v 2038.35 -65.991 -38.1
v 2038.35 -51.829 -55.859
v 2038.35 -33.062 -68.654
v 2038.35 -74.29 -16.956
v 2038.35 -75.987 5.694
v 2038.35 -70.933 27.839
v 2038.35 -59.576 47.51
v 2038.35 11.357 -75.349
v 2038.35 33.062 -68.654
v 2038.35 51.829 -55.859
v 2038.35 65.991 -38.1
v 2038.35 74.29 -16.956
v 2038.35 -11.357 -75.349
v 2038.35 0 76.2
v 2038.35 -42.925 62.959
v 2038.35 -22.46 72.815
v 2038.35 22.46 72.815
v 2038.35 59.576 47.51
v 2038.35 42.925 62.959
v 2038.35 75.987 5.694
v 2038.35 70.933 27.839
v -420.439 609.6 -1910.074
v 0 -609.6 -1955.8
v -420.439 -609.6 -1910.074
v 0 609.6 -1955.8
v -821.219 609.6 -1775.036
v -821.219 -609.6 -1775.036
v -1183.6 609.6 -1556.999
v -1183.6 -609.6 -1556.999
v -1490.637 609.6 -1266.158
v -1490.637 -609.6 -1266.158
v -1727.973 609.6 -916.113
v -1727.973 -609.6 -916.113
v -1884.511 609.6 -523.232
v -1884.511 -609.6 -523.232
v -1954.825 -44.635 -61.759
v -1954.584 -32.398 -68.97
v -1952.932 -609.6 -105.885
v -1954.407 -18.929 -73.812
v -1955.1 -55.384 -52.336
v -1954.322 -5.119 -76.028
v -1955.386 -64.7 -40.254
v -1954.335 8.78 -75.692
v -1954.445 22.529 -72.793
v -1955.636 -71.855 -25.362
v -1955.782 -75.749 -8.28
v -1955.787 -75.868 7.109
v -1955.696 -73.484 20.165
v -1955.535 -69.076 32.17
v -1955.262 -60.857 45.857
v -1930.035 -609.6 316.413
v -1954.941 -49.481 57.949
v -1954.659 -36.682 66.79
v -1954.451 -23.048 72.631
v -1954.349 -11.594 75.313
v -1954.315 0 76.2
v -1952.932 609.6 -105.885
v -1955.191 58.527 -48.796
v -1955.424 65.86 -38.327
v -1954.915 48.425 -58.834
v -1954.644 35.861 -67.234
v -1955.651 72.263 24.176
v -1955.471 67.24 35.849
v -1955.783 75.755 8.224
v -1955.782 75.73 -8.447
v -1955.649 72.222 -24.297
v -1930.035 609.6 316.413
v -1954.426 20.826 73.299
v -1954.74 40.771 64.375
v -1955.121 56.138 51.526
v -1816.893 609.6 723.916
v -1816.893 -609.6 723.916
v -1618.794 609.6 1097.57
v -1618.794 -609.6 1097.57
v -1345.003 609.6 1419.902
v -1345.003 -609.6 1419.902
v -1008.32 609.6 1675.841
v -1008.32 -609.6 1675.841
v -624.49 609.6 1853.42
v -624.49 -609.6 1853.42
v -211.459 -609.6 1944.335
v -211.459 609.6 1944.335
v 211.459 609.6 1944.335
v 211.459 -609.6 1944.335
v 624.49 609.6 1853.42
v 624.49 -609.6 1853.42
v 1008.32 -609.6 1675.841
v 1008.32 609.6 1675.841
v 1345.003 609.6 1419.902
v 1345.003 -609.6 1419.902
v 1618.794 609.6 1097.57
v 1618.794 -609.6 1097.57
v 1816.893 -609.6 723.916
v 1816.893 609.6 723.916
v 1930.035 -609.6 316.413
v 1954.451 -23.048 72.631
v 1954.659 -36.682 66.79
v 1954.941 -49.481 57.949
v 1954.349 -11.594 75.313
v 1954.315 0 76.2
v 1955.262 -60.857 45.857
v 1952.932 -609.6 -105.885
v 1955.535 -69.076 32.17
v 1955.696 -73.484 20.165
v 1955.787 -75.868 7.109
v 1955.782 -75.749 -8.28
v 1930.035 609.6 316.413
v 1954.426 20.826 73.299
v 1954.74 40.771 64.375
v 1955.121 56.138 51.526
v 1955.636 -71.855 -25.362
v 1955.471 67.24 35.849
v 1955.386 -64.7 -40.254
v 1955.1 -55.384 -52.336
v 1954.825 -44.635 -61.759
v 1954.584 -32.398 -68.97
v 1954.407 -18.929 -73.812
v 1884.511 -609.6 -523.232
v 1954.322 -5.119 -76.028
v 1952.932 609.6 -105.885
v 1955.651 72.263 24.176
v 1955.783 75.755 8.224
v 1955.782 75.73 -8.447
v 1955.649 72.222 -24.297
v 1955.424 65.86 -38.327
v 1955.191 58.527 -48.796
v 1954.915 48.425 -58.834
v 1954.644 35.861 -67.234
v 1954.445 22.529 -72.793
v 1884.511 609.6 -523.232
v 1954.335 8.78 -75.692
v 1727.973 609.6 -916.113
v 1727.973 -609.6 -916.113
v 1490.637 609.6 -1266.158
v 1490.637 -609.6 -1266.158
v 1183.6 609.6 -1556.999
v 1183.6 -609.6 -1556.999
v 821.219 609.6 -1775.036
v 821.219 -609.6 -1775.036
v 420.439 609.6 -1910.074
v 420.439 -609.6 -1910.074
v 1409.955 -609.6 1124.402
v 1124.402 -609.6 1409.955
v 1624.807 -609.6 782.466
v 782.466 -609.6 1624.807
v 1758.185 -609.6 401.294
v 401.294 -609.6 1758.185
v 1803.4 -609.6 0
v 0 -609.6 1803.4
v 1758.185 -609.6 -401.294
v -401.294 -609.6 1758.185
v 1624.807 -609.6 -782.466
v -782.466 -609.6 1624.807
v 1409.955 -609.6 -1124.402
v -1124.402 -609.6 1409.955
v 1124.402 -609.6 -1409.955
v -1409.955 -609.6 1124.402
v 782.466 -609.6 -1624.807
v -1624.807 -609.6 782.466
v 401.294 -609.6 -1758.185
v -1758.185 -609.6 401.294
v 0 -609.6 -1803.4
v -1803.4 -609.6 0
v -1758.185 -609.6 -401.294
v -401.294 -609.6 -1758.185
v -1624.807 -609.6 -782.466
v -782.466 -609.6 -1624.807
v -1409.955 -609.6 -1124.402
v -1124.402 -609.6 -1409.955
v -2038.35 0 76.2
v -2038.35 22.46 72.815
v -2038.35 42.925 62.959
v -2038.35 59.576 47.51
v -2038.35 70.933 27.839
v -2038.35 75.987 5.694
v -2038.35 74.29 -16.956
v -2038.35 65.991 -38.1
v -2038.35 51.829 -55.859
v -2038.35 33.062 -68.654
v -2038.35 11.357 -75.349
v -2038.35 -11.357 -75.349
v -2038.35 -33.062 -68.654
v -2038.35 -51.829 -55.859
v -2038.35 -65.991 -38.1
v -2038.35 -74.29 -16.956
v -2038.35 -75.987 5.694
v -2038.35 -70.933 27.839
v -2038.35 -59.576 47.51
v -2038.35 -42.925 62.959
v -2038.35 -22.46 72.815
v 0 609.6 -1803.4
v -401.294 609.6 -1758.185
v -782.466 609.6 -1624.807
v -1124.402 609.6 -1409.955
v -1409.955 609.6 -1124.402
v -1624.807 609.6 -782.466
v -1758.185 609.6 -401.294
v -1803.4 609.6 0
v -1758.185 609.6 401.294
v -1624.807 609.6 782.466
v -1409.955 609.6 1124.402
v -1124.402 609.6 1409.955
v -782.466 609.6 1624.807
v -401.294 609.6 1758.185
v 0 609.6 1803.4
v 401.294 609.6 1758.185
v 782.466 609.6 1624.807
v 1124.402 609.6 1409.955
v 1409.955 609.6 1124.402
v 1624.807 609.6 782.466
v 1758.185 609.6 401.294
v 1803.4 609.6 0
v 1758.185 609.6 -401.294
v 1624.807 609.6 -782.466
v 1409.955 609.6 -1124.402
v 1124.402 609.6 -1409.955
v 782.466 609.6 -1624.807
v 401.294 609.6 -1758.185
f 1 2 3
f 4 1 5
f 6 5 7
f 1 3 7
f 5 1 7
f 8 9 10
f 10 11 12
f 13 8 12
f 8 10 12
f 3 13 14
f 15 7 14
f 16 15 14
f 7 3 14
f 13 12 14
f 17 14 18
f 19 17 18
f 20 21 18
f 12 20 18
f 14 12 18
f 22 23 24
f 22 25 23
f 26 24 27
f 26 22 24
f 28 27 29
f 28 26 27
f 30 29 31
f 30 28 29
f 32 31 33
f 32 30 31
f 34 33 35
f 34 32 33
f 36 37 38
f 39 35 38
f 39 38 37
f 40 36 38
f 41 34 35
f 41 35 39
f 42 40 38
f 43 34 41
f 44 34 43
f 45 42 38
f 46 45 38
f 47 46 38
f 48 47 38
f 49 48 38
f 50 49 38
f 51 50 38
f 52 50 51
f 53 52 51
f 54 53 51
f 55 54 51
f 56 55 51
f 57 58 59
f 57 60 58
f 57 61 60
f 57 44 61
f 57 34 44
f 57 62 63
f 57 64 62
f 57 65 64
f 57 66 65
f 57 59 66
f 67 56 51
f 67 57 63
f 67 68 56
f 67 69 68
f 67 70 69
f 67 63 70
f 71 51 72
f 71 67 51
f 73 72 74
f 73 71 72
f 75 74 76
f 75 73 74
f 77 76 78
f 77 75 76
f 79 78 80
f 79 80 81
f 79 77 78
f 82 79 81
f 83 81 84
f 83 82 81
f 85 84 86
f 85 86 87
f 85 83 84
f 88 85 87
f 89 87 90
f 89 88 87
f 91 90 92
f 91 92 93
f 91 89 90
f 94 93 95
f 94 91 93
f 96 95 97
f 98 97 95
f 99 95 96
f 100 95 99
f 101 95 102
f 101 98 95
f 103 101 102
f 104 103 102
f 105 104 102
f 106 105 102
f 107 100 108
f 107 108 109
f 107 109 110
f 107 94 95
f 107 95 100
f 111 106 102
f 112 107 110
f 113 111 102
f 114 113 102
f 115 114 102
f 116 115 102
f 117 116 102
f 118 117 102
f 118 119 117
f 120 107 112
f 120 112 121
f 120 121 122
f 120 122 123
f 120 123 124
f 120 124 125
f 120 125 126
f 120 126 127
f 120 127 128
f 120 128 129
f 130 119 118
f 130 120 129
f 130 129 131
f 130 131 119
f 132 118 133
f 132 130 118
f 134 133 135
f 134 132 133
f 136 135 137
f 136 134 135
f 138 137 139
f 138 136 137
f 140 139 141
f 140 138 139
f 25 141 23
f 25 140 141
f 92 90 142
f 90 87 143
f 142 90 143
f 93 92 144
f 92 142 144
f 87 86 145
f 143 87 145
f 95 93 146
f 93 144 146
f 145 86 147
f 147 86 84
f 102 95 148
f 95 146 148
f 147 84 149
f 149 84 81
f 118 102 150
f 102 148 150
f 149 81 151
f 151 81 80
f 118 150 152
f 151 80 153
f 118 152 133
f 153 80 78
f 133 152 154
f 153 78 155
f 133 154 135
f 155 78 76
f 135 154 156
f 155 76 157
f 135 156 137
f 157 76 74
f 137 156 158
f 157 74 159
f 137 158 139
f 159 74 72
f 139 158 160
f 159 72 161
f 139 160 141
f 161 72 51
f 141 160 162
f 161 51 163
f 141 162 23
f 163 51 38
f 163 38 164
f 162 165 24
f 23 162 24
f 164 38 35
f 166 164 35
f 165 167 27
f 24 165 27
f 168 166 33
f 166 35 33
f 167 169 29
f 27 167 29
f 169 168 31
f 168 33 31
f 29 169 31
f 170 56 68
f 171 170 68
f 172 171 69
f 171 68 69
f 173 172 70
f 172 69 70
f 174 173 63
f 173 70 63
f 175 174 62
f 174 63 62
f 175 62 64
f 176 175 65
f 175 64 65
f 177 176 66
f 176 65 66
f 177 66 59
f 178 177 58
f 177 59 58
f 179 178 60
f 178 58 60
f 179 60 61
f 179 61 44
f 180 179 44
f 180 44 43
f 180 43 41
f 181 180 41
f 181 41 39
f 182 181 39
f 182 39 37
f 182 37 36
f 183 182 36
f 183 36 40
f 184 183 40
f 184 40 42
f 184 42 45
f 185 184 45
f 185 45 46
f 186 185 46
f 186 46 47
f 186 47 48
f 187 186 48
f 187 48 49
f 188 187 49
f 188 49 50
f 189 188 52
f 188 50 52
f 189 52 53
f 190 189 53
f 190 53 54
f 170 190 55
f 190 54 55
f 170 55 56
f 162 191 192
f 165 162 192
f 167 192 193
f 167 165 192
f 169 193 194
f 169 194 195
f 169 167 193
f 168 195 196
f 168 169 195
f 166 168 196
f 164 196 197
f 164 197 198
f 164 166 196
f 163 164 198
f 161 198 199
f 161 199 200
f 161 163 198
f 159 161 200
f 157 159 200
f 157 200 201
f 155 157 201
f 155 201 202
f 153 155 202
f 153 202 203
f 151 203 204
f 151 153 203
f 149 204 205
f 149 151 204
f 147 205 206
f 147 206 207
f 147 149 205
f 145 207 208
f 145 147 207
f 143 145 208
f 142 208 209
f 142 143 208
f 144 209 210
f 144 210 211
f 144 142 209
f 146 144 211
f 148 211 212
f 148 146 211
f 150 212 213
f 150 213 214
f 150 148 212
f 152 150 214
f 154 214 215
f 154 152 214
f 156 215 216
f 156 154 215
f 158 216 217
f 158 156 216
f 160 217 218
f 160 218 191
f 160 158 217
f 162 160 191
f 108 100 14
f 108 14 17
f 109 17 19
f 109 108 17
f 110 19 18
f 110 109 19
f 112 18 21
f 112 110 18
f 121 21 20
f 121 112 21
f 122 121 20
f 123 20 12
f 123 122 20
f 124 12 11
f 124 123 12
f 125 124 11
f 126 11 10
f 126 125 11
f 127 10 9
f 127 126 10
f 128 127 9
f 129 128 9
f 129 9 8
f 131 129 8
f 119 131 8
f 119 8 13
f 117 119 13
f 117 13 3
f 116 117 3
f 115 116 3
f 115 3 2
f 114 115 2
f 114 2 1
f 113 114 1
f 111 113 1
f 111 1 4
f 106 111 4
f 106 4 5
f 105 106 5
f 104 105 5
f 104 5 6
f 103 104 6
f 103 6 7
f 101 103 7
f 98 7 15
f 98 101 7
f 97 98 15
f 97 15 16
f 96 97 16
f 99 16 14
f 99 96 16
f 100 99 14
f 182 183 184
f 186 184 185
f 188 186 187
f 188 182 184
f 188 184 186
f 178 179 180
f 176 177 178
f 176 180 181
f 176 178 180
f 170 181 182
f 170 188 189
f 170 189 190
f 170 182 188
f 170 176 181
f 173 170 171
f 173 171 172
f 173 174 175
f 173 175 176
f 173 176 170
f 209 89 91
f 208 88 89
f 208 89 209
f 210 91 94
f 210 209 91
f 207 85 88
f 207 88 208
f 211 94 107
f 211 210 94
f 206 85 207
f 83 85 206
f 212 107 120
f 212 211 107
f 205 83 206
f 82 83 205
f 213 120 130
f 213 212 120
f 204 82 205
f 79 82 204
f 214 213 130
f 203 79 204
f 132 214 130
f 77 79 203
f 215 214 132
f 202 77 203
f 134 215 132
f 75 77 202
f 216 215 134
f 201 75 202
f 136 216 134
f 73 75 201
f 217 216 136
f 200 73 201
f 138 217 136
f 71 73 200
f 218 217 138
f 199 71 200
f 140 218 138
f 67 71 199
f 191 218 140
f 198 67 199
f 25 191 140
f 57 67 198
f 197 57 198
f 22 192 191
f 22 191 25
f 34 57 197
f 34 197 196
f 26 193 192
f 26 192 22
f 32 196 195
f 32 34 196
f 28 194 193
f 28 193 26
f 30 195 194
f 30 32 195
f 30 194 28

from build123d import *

# Parameters (mm, degrees)
SKETCH1_R           = 1955.8
SKETCH1_R_2         = 1803.4
BOSS_EXTRUDE1_DEPTH = 609.6
BOSS_EXTRUDE2_START = -76.2
SKETCH2_R           = 76.2
BOSS_EXTRUDE2_DEPTH = 158.75


with BuildPart() as part:
    # Sketch1 → Boss-Extrude1 (new, symmetric)
    with BuildSketch(Plane(origin=(0, 0, 0), x_dir=(1, 0, 0), z_dir=(0, 1, 0))):
        with Locations(Location((0, 0, 0), (0, 0, 90))):
            Circle(SKETCH1_R)
        with Locations(Location((0, 0, 0), (0, 0, 90))):
            Circle(SKETCH1_R_2, mode=Mode.SUBTRACT)
    extrude(amount=BOSS_EXTRUDE1_DEPTH, both=True)

    # Sketch2 → Boss-Extrude2 (add)
    with BuildSketch(Plane.ZY.offset(1955.8).offset(BOSS_EXTRUDE2_START)):
        Circle(SKETCH2_R)
    boss_extrude2 = extrude(amount=BOSS_EXTRUDE2_DEPTH)

    # Mirror1: Boss-Extrude2 across plane
    add(boss_extrude2.mirror(Plane(origin=(0, 0, 0), x_dir=(0, 0, 1), z_dir=(1, 0, 0))))


solid = part.part
